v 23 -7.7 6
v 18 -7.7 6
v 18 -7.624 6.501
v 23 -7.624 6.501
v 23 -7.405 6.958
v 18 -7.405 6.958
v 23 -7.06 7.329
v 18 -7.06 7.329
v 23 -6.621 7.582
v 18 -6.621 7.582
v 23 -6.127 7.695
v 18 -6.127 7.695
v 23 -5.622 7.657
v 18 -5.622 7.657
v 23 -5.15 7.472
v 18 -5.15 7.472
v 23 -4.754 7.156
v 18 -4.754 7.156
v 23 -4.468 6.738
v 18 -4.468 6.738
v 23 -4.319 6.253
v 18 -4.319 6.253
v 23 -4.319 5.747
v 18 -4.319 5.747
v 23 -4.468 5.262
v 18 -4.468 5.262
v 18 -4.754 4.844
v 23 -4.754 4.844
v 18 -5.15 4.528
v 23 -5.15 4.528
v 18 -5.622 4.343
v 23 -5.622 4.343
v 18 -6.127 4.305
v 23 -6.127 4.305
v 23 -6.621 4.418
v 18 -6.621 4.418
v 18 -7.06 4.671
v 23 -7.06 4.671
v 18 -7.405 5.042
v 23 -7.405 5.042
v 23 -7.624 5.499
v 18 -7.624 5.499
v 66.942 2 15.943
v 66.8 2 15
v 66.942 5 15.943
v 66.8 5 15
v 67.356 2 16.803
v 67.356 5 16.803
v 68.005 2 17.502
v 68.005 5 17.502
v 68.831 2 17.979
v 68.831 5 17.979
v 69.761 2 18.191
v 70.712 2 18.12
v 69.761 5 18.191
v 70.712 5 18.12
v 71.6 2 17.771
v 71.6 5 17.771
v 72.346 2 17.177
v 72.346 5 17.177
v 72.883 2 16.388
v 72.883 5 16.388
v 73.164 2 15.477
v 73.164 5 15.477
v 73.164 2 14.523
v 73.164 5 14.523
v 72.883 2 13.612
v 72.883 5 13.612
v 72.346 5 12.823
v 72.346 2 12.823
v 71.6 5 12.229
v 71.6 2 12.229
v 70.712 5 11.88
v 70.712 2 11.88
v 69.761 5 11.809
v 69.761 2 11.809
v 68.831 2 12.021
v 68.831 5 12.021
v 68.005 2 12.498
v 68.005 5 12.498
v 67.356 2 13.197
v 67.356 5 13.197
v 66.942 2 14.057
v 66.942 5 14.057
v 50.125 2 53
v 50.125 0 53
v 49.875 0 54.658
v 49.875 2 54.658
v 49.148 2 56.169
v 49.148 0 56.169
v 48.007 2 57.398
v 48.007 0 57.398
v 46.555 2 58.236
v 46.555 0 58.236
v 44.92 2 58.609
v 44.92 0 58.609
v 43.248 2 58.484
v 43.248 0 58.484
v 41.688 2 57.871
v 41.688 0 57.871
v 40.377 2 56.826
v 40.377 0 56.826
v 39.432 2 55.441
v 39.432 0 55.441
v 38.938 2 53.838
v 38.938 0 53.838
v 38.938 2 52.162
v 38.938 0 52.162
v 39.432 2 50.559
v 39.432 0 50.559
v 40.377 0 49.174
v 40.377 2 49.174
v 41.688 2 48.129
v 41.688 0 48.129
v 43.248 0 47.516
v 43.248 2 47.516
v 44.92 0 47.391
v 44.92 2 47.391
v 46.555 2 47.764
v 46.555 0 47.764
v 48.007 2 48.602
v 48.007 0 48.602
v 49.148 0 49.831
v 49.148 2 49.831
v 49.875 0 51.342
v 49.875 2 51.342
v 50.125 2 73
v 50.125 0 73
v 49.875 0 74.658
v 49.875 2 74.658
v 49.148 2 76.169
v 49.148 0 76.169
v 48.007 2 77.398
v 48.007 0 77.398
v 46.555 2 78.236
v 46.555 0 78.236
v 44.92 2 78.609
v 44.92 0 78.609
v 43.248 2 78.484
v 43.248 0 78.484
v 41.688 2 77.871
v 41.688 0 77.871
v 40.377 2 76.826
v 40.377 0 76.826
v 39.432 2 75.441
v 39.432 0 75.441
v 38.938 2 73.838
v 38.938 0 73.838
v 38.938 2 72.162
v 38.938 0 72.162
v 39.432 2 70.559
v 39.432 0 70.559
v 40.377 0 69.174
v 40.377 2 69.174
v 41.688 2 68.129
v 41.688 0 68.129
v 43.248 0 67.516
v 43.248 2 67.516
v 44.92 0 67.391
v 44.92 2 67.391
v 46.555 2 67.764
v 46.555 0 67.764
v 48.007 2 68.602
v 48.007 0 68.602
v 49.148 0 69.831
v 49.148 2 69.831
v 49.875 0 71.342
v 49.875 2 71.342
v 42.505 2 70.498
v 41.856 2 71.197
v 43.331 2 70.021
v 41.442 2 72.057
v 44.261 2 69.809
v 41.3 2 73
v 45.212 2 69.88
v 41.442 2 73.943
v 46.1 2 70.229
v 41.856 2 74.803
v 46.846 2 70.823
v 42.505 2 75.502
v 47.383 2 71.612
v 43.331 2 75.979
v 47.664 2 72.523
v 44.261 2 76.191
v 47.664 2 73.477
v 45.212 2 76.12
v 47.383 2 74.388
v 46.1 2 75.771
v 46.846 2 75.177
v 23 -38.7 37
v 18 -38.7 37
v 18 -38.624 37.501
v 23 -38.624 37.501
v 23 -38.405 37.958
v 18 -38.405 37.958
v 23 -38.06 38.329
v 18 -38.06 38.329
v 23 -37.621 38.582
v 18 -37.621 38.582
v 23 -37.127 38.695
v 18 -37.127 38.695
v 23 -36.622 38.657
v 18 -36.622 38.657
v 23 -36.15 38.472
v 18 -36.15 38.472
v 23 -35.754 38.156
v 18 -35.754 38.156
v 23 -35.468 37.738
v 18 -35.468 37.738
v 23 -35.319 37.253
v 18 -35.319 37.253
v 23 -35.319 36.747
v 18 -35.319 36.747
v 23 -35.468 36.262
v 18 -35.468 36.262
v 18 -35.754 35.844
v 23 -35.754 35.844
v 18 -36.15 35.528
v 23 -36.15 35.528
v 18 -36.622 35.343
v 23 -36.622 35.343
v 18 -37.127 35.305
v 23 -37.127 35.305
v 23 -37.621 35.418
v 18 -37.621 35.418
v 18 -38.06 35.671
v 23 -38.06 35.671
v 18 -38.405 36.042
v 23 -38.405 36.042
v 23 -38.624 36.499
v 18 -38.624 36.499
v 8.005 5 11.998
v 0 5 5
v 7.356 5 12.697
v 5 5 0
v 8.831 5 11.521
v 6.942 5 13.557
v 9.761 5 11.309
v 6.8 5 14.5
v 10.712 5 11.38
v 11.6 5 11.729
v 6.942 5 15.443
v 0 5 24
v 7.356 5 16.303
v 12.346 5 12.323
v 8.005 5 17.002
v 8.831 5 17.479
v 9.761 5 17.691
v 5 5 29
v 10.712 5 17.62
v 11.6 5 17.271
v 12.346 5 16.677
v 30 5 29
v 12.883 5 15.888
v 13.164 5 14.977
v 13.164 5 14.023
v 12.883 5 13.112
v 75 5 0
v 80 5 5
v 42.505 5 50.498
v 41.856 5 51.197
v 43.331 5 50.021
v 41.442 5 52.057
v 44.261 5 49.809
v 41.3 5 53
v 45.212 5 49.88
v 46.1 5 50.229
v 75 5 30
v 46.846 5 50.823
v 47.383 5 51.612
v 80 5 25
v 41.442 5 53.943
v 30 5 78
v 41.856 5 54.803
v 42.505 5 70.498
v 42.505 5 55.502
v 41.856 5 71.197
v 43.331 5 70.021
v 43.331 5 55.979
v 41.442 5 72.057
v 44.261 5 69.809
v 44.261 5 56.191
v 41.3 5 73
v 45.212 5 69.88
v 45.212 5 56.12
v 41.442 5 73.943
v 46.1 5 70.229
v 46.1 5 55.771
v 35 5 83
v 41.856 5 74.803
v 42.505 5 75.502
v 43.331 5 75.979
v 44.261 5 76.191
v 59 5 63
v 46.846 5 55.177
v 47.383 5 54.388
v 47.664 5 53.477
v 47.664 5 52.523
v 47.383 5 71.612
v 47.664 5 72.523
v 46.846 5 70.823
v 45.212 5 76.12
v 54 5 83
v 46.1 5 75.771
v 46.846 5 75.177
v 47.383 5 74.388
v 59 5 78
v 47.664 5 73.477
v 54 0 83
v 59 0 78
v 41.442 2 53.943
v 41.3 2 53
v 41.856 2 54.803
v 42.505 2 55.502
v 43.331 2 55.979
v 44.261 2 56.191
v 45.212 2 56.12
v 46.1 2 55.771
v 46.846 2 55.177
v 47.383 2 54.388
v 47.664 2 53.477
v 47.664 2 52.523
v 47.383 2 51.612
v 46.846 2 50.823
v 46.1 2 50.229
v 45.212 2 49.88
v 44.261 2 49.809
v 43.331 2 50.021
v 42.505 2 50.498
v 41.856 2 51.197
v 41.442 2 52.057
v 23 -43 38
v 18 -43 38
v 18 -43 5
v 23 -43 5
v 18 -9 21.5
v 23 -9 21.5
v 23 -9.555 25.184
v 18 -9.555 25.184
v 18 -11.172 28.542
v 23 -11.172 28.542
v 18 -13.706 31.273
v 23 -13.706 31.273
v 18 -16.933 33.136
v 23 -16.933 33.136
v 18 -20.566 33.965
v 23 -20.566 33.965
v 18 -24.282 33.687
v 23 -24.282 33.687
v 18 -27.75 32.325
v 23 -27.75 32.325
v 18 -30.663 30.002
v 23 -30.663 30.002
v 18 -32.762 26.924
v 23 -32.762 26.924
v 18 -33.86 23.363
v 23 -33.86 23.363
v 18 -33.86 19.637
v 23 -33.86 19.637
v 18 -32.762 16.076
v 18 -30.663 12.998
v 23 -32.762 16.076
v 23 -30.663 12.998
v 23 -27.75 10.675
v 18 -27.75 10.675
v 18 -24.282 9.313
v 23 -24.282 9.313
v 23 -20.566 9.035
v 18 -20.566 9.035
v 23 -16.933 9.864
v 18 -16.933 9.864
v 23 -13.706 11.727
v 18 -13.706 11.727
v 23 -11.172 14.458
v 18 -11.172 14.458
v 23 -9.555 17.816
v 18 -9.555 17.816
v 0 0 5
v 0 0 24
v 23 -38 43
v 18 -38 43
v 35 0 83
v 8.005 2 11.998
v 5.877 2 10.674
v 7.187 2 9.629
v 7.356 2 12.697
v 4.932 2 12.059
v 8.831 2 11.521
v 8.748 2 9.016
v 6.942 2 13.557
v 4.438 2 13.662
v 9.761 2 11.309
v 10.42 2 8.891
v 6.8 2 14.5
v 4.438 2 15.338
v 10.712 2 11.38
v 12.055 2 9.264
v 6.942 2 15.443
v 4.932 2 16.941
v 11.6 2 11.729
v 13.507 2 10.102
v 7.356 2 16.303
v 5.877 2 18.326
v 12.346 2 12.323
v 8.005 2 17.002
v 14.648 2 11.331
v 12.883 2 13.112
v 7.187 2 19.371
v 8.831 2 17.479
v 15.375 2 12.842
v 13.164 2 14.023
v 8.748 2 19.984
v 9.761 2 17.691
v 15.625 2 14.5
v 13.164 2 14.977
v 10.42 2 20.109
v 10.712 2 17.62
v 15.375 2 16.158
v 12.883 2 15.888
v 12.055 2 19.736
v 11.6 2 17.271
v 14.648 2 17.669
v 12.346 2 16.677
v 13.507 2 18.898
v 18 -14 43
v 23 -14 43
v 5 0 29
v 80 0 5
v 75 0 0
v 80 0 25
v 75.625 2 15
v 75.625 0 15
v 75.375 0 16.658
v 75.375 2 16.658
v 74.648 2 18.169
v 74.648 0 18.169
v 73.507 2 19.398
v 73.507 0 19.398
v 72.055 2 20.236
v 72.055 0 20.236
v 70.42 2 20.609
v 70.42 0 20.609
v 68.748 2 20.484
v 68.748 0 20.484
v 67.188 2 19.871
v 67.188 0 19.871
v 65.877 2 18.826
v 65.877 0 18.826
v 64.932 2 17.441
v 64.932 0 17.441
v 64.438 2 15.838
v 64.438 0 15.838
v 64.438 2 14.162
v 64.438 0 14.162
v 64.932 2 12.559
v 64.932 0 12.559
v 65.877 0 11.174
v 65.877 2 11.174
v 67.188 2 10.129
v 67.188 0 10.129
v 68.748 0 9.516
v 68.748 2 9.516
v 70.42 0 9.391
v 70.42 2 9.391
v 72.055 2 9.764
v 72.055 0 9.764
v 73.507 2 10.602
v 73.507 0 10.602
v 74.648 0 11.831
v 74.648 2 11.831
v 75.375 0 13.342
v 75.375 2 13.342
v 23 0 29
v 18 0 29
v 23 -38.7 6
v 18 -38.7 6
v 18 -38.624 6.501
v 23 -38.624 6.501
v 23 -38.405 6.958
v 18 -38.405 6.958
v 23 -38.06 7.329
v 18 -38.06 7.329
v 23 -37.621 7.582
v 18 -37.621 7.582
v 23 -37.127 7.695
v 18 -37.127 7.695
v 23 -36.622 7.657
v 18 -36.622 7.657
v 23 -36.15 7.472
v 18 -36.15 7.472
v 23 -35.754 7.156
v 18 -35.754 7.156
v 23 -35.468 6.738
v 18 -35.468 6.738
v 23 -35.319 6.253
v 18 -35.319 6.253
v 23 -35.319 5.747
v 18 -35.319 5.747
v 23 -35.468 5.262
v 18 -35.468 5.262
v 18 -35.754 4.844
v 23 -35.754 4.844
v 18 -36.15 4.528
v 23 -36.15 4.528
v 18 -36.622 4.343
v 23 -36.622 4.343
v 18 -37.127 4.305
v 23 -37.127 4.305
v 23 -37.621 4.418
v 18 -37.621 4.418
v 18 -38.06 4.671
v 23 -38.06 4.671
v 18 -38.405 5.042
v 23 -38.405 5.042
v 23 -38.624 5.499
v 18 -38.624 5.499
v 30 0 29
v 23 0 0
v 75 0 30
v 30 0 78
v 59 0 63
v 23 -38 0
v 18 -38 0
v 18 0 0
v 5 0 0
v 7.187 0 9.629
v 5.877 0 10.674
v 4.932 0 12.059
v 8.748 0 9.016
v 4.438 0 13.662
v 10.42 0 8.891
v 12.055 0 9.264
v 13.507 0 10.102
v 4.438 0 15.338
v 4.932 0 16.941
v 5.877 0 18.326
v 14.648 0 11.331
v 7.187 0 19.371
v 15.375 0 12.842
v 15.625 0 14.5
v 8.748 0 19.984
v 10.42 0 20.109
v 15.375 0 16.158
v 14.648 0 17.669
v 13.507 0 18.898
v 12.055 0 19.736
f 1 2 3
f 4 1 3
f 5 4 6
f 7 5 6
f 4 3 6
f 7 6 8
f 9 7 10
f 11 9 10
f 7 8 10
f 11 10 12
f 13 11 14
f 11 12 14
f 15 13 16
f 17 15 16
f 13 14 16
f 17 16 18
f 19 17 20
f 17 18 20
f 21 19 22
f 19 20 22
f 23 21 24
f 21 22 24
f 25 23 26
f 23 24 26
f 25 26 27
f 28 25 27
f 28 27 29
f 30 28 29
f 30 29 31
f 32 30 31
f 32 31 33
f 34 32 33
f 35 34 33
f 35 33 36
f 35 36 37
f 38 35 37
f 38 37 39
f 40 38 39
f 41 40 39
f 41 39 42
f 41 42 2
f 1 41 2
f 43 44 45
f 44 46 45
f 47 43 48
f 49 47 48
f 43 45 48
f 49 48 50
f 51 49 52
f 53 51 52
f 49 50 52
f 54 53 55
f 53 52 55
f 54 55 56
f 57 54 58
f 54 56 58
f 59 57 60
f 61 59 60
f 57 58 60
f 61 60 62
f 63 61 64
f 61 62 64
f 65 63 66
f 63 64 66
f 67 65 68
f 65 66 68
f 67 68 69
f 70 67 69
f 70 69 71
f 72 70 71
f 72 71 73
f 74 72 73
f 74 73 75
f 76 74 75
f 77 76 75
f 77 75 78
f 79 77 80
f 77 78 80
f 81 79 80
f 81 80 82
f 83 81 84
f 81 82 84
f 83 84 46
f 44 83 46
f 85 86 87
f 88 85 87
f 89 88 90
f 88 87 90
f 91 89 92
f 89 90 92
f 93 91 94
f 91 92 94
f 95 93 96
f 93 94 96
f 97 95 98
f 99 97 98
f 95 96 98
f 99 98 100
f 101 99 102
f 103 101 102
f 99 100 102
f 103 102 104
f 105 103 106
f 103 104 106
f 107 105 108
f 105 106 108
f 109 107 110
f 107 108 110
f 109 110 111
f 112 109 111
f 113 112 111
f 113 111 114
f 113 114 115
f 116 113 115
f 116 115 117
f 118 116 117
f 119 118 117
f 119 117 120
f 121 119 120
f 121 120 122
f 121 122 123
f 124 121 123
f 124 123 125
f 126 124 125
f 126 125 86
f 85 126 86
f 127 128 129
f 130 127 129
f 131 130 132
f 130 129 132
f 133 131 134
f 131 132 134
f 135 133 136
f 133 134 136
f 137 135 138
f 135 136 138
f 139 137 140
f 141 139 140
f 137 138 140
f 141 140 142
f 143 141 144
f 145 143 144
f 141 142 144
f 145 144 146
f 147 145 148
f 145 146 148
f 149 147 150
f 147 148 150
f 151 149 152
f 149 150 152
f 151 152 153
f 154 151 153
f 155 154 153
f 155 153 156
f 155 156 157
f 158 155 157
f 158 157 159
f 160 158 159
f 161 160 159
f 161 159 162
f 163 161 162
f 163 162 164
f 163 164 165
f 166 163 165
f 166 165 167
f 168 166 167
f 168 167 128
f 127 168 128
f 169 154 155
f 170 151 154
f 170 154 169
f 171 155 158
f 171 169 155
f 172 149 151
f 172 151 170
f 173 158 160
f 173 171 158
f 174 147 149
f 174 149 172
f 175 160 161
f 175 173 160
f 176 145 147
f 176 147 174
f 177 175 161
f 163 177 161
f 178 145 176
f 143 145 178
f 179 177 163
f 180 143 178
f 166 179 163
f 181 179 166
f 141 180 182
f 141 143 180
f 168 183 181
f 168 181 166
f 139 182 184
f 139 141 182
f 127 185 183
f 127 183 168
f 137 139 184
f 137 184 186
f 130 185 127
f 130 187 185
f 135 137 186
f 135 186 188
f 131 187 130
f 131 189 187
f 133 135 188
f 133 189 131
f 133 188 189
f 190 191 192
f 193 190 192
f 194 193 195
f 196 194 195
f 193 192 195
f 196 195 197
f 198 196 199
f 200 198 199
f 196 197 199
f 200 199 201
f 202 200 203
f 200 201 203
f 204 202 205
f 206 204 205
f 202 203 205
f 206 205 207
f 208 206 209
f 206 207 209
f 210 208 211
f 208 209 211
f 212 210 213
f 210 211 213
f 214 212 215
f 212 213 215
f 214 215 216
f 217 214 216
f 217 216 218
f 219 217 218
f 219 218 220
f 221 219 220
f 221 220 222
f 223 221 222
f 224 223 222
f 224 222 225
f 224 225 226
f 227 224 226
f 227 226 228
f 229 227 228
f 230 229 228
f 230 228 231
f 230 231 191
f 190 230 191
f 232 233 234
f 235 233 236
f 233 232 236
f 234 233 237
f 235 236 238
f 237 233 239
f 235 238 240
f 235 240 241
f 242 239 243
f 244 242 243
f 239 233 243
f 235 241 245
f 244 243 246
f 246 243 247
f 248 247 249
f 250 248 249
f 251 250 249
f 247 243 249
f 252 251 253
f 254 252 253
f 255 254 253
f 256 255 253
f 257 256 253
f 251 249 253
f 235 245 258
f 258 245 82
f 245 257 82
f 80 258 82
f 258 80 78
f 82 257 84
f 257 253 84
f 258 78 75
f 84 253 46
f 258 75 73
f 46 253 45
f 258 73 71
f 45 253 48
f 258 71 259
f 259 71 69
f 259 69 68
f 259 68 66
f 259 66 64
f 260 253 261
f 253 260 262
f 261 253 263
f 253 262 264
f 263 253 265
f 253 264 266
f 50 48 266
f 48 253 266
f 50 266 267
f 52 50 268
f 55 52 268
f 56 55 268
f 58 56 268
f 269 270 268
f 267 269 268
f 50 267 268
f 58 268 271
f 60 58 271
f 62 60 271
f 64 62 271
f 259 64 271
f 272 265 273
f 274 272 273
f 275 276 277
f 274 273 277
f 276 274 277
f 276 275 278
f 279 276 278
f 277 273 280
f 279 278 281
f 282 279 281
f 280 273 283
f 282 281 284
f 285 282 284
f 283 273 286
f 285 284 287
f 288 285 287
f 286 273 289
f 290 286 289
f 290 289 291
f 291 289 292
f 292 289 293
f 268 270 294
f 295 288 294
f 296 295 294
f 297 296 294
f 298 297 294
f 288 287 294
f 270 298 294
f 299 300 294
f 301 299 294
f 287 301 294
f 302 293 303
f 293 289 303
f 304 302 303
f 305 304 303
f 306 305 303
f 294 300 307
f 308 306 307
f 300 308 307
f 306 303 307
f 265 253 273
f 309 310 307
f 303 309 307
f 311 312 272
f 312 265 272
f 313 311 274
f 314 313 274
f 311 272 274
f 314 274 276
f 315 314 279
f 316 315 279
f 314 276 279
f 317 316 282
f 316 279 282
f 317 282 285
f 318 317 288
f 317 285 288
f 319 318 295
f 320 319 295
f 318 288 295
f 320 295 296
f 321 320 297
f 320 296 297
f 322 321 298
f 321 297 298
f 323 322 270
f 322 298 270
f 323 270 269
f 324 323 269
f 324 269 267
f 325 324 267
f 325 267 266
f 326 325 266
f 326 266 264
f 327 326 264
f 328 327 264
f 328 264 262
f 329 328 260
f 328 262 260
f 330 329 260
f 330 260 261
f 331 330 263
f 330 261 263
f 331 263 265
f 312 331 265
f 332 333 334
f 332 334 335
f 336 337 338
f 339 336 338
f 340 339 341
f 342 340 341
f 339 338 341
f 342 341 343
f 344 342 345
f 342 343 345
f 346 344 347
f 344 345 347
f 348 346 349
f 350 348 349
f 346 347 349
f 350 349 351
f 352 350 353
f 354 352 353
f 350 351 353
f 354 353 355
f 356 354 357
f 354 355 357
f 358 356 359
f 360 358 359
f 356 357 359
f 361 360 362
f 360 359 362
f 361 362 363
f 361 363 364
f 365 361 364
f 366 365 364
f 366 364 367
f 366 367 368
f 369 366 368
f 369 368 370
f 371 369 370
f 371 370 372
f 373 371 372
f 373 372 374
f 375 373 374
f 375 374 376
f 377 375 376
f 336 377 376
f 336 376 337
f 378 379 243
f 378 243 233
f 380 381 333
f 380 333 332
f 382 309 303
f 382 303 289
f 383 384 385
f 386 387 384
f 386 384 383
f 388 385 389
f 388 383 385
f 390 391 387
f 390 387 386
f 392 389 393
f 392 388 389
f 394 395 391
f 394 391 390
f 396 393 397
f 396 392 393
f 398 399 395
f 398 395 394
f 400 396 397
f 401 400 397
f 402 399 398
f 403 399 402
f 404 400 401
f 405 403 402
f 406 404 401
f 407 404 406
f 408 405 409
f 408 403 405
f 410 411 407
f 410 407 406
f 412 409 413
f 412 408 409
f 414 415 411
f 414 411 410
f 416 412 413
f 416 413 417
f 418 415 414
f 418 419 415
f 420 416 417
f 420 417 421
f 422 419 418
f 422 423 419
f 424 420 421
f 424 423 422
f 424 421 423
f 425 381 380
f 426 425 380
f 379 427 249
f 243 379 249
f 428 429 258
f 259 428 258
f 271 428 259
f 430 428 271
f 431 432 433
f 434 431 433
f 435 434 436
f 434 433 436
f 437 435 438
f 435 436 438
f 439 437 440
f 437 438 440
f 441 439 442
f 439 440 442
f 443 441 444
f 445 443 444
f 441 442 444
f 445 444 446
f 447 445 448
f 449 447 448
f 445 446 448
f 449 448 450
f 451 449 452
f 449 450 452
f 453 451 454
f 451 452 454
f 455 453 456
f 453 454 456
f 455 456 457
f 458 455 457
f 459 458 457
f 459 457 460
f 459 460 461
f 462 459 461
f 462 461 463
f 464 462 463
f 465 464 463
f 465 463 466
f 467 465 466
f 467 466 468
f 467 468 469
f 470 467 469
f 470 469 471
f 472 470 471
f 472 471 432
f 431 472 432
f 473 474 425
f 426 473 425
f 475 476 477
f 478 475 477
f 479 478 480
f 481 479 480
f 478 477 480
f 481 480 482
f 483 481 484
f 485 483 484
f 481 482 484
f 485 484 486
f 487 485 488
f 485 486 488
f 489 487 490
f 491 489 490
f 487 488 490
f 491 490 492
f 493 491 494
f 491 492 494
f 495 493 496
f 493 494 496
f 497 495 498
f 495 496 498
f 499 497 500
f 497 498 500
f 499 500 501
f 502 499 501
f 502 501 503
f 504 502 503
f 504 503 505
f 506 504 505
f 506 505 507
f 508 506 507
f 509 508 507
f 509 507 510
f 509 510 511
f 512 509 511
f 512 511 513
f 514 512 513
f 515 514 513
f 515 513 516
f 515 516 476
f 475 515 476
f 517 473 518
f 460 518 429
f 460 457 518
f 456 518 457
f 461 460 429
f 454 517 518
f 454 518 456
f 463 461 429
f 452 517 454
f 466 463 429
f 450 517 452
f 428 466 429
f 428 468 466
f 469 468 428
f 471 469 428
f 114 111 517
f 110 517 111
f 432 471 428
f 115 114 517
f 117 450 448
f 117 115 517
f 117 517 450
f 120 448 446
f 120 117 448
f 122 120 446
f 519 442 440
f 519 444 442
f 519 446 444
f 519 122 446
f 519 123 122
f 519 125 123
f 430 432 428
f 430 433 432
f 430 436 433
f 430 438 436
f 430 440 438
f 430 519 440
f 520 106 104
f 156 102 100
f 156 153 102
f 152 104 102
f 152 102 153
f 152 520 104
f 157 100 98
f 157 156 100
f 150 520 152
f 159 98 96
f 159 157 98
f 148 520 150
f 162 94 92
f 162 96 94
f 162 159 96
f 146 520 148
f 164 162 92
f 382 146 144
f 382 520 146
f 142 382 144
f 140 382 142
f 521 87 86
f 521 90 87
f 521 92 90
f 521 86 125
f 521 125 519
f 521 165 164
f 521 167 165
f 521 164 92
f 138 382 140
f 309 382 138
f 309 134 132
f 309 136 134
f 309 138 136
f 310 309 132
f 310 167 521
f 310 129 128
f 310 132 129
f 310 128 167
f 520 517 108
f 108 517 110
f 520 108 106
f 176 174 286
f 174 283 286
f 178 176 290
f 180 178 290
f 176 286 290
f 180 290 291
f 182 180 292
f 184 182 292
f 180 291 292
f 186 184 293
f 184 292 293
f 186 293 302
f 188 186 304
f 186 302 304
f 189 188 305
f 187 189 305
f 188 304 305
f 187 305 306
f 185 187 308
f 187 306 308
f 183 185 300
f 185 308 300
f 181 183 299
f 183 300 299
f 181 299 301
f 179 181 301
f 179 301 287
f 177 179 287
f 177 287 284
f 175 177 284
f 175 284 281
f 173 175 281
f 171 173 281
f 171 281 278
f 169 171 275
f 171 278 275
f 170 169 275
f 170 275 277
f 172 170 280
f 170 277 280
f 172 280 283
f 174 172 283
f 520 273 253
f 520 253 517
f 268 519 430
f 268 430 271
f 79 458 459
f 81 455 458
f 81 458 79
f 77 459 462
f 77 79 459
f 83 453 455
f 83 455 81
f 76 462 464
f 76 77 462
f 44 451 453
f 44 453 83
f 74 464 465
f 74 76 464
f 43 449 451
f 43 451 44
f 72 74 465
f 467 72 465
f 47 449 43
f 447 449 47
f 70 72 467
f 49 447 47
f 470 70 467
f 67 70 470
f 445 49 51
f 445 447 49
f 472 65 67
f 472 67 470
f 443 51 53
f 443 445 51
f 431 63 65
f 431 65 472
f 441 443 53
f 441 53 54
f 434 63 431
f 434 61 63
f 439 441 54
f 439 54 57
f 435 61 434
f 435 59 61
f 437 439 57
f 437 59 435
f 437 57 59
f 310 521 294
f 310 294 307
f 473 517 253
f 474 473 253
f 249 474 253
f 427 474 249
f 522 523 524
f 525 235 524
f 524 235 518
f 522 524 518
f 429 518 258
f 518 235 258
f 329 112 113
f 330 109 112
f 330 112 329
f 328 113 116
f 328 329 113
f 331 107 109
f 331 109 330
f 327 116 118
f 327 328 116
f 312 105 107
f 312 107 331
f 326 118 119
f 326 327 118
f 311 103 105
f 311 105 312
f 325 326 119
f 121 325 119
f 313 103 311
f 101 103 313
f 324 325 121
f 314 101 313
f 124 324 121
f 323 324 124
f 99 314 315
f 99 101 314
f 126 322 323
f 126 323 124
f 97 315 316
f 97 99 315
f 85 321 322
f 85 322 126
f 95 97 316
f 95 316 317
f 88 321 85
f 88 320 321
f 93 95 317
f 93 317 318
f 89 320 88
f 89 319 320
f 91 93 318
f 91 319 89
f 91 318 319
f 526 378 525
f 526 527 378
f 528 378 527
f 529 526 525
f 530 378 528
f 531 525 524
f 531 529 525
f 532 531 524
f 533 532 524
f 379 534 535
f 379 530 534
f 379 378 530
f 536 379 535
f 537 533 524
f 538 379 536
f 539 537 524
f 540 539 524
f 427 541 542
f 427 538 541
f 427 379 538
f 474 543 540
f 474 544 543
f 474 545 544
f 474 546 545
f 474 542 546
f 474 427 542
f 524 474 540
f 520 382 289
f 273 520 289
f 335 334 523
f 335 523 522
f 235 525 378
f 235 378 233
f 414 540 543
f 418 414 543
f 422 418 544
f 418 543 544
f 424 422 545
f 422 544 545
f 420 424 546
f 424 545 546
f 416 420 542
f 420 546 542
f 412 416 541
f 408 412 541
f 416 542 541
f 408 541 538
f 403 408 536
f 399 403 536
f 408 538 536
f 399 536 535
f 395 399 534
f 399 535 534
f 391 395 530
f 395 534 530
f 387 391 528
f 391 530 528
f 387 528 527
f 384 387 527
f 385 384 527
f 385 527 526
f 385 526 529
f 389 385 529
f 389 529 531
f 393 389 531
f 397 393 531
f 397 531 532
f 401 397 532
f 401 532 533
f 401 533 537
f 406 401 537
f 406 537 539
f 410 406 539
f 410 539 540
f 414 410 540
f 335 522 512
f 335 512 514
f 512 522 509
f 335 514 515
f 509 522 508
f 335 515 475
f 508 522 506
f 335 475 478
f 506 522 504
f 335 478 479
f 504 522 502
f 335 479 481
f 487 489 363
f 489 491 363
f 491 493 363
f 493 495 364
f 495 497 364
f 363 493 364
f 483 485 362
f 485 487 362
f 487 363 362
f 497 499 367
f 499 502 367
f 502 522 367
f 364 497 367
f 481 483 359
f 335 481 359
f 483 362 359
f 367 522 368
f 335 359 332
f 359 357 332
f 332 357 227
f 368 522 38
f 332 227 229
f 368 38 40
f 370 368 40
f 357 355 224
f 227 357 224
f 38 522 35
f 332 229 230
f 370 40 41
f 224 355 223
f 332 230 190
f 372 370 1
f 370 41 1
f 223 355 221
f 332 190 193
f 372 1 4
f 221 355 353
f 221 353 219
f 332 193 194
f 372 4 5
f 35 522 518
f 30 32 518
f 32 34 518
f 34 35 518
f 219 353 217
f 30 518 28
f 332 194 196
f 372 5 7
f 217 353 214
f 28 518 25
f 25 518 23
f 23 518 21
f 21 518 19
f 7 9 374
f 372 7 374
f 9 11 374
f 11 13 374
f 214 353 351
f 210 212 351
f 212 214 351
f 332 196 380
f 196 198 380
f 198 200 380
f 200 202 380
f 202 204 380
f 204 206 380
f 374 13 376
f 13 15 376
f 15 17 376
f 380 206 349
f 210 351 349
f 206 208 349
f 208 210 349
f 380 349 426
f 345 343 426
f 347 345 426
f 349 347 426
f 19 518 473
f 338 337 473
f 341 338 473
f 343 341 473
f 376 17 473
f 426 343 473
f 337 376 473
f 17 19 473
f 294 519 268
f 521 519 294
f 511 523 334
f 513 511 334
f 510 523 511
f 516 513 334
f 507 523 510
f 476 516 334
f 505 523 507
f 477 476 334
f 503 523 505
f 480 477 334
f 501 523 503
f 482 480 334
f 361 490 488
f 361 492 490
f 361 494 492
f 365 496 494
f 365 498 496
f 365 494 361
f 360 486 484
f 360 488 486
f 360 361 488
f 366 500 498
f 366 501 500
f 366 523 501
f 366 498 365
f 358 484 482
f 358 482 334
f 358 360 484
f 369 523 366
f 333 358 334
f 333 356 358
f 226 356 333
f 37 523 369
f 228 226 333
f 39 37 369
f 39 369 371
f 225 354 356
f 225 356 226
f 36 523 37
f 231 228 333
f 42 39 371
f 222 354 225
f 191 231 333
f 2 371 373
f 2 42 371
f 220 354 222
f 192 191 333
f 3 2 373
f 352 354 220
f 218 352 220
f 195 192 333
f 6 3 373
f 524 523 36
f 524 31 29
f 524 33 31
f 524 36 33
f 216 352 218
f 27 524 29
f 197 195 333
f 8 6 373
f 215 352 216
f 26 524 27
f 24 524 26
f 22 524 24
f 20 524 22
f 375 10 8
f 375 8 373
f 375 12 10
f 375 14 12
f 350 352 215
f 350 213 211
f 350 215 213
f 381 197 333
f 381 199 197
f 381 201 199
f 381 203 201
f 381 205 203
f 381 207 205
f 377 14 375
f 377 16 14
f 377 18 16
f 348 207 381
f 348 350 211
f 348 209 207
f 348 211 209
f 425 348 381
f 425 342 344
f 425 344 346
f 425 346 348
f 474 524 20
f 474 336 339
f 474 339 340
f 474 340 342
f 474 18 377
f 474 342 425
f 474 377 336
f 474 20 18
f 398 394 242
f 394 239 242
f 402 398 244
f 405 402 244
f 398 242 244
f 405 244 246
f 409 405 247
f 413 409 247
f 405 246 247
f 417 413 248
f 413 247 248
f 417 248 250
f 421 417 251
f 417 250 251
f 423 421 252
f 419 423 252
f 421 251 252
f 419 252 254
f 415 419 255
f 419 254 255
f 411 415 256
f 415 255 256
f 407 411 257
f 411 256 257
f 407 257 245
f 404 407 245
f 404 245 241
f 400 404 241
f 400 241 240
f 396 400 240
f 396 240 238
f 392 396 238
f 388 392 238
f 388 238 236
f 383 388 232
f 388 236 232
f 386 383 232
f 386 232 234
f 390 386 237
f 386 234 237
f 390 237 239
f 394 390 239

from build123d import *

# Parameters (mm, degrees)
F1_DEPTH       = 5
F2_D           = 6.4
F2_CBORE_D     = 11.25
F2_CBORE_DEPTH = 2
F3_W           = 5
F3_H           = 43
F4_DEPTH       = 43
F6_D           = 3.4
F5_R           = 12.5
F7_DEPTH       = 23.001
F10_DEPTH      = 12
F11_SIZE       = 4.99999


# Not quite as in the source:
# - a fillet or chamfer is up to 0.001 mm smaller than in the source, because OpenCascade refuses the exact size
# - a feature names something its author has since deleted; it is built from what else it names


with BuildPart() as f1:
    # F0 (on Front) → F1 (new body)
    with BuildSketch(Plane.XZ):
        Polygon((0, 29), (0, 0), (80, 0), (80, 30), (75, 30), (59, 63), (59, 83), (30, 83), (30, 43), (18, 43), (18, 29), align=None)
    extrude(amount=-F1_DEPTH)

    # F2 (through all)
    with Locations(Plane.XZ):
        with Locations((10, 14.5), (44.5, 53), (44.5, 73), (70, 15)):
            CounterBoreHole(F2_D / 2, F2_CBORE_D / 2, F2_CBORE_DEPTH)

    # F3 (on face) → F4 (join)
    with BuildSketch(Plane.XZ):
        with Locations((20.5, 21.5)):
            Rectangle(F3_W, F3_H)
    extrude(amount=F4_DEPTH)

    # F6 (through all)
    with Locations(Plane.YZ.offset(23)):
        with Locations((-37, 37), (-6, 6), (-37, 6)):
            Hole(F6_D / 2)

    # F5 (on face) → F7 (cut, through all)
    with BuildSketch(Plane.YZ.offset(23)):
        with Locations((-21.5, 21.5)):
            Circle(F5_R)
    extrude(amount=-F7_DEPTH, mode=Mode.SUBTRACT)

    # F9 (on face) → F10 (cut, through all)
    with BuildSketch(Plane(origin=(18, 0, 0), x_dir=(0, -1, 0), z_dir=(-1, 0, 0))):
        Polygon((14, 43), (-5, 43), (-5, 29), (0, 29), align=None)
    extrude(amount=-F10_DEPTH, mode=Mode.SUBTRACT)

    # F11 (size 5 in the source; OpenCascade refuses exactly that, so slightly less here)
    f11_edges = [f1.edges().sort_by_distance(p)[0] for p in [
        (30, 2.5, 83),
        (59, 2.5, 83),
        (80, 2.5, 30),
        (80, 2.5, 0),
        (20.5, -43, 0),
        (0, 2.5, 0),
        (0, 2.5, 29),
        (20.5, -43, 43),
    ]]
    chamfer(f11_edges, length=F11_SIZE)


solid = f1.part
